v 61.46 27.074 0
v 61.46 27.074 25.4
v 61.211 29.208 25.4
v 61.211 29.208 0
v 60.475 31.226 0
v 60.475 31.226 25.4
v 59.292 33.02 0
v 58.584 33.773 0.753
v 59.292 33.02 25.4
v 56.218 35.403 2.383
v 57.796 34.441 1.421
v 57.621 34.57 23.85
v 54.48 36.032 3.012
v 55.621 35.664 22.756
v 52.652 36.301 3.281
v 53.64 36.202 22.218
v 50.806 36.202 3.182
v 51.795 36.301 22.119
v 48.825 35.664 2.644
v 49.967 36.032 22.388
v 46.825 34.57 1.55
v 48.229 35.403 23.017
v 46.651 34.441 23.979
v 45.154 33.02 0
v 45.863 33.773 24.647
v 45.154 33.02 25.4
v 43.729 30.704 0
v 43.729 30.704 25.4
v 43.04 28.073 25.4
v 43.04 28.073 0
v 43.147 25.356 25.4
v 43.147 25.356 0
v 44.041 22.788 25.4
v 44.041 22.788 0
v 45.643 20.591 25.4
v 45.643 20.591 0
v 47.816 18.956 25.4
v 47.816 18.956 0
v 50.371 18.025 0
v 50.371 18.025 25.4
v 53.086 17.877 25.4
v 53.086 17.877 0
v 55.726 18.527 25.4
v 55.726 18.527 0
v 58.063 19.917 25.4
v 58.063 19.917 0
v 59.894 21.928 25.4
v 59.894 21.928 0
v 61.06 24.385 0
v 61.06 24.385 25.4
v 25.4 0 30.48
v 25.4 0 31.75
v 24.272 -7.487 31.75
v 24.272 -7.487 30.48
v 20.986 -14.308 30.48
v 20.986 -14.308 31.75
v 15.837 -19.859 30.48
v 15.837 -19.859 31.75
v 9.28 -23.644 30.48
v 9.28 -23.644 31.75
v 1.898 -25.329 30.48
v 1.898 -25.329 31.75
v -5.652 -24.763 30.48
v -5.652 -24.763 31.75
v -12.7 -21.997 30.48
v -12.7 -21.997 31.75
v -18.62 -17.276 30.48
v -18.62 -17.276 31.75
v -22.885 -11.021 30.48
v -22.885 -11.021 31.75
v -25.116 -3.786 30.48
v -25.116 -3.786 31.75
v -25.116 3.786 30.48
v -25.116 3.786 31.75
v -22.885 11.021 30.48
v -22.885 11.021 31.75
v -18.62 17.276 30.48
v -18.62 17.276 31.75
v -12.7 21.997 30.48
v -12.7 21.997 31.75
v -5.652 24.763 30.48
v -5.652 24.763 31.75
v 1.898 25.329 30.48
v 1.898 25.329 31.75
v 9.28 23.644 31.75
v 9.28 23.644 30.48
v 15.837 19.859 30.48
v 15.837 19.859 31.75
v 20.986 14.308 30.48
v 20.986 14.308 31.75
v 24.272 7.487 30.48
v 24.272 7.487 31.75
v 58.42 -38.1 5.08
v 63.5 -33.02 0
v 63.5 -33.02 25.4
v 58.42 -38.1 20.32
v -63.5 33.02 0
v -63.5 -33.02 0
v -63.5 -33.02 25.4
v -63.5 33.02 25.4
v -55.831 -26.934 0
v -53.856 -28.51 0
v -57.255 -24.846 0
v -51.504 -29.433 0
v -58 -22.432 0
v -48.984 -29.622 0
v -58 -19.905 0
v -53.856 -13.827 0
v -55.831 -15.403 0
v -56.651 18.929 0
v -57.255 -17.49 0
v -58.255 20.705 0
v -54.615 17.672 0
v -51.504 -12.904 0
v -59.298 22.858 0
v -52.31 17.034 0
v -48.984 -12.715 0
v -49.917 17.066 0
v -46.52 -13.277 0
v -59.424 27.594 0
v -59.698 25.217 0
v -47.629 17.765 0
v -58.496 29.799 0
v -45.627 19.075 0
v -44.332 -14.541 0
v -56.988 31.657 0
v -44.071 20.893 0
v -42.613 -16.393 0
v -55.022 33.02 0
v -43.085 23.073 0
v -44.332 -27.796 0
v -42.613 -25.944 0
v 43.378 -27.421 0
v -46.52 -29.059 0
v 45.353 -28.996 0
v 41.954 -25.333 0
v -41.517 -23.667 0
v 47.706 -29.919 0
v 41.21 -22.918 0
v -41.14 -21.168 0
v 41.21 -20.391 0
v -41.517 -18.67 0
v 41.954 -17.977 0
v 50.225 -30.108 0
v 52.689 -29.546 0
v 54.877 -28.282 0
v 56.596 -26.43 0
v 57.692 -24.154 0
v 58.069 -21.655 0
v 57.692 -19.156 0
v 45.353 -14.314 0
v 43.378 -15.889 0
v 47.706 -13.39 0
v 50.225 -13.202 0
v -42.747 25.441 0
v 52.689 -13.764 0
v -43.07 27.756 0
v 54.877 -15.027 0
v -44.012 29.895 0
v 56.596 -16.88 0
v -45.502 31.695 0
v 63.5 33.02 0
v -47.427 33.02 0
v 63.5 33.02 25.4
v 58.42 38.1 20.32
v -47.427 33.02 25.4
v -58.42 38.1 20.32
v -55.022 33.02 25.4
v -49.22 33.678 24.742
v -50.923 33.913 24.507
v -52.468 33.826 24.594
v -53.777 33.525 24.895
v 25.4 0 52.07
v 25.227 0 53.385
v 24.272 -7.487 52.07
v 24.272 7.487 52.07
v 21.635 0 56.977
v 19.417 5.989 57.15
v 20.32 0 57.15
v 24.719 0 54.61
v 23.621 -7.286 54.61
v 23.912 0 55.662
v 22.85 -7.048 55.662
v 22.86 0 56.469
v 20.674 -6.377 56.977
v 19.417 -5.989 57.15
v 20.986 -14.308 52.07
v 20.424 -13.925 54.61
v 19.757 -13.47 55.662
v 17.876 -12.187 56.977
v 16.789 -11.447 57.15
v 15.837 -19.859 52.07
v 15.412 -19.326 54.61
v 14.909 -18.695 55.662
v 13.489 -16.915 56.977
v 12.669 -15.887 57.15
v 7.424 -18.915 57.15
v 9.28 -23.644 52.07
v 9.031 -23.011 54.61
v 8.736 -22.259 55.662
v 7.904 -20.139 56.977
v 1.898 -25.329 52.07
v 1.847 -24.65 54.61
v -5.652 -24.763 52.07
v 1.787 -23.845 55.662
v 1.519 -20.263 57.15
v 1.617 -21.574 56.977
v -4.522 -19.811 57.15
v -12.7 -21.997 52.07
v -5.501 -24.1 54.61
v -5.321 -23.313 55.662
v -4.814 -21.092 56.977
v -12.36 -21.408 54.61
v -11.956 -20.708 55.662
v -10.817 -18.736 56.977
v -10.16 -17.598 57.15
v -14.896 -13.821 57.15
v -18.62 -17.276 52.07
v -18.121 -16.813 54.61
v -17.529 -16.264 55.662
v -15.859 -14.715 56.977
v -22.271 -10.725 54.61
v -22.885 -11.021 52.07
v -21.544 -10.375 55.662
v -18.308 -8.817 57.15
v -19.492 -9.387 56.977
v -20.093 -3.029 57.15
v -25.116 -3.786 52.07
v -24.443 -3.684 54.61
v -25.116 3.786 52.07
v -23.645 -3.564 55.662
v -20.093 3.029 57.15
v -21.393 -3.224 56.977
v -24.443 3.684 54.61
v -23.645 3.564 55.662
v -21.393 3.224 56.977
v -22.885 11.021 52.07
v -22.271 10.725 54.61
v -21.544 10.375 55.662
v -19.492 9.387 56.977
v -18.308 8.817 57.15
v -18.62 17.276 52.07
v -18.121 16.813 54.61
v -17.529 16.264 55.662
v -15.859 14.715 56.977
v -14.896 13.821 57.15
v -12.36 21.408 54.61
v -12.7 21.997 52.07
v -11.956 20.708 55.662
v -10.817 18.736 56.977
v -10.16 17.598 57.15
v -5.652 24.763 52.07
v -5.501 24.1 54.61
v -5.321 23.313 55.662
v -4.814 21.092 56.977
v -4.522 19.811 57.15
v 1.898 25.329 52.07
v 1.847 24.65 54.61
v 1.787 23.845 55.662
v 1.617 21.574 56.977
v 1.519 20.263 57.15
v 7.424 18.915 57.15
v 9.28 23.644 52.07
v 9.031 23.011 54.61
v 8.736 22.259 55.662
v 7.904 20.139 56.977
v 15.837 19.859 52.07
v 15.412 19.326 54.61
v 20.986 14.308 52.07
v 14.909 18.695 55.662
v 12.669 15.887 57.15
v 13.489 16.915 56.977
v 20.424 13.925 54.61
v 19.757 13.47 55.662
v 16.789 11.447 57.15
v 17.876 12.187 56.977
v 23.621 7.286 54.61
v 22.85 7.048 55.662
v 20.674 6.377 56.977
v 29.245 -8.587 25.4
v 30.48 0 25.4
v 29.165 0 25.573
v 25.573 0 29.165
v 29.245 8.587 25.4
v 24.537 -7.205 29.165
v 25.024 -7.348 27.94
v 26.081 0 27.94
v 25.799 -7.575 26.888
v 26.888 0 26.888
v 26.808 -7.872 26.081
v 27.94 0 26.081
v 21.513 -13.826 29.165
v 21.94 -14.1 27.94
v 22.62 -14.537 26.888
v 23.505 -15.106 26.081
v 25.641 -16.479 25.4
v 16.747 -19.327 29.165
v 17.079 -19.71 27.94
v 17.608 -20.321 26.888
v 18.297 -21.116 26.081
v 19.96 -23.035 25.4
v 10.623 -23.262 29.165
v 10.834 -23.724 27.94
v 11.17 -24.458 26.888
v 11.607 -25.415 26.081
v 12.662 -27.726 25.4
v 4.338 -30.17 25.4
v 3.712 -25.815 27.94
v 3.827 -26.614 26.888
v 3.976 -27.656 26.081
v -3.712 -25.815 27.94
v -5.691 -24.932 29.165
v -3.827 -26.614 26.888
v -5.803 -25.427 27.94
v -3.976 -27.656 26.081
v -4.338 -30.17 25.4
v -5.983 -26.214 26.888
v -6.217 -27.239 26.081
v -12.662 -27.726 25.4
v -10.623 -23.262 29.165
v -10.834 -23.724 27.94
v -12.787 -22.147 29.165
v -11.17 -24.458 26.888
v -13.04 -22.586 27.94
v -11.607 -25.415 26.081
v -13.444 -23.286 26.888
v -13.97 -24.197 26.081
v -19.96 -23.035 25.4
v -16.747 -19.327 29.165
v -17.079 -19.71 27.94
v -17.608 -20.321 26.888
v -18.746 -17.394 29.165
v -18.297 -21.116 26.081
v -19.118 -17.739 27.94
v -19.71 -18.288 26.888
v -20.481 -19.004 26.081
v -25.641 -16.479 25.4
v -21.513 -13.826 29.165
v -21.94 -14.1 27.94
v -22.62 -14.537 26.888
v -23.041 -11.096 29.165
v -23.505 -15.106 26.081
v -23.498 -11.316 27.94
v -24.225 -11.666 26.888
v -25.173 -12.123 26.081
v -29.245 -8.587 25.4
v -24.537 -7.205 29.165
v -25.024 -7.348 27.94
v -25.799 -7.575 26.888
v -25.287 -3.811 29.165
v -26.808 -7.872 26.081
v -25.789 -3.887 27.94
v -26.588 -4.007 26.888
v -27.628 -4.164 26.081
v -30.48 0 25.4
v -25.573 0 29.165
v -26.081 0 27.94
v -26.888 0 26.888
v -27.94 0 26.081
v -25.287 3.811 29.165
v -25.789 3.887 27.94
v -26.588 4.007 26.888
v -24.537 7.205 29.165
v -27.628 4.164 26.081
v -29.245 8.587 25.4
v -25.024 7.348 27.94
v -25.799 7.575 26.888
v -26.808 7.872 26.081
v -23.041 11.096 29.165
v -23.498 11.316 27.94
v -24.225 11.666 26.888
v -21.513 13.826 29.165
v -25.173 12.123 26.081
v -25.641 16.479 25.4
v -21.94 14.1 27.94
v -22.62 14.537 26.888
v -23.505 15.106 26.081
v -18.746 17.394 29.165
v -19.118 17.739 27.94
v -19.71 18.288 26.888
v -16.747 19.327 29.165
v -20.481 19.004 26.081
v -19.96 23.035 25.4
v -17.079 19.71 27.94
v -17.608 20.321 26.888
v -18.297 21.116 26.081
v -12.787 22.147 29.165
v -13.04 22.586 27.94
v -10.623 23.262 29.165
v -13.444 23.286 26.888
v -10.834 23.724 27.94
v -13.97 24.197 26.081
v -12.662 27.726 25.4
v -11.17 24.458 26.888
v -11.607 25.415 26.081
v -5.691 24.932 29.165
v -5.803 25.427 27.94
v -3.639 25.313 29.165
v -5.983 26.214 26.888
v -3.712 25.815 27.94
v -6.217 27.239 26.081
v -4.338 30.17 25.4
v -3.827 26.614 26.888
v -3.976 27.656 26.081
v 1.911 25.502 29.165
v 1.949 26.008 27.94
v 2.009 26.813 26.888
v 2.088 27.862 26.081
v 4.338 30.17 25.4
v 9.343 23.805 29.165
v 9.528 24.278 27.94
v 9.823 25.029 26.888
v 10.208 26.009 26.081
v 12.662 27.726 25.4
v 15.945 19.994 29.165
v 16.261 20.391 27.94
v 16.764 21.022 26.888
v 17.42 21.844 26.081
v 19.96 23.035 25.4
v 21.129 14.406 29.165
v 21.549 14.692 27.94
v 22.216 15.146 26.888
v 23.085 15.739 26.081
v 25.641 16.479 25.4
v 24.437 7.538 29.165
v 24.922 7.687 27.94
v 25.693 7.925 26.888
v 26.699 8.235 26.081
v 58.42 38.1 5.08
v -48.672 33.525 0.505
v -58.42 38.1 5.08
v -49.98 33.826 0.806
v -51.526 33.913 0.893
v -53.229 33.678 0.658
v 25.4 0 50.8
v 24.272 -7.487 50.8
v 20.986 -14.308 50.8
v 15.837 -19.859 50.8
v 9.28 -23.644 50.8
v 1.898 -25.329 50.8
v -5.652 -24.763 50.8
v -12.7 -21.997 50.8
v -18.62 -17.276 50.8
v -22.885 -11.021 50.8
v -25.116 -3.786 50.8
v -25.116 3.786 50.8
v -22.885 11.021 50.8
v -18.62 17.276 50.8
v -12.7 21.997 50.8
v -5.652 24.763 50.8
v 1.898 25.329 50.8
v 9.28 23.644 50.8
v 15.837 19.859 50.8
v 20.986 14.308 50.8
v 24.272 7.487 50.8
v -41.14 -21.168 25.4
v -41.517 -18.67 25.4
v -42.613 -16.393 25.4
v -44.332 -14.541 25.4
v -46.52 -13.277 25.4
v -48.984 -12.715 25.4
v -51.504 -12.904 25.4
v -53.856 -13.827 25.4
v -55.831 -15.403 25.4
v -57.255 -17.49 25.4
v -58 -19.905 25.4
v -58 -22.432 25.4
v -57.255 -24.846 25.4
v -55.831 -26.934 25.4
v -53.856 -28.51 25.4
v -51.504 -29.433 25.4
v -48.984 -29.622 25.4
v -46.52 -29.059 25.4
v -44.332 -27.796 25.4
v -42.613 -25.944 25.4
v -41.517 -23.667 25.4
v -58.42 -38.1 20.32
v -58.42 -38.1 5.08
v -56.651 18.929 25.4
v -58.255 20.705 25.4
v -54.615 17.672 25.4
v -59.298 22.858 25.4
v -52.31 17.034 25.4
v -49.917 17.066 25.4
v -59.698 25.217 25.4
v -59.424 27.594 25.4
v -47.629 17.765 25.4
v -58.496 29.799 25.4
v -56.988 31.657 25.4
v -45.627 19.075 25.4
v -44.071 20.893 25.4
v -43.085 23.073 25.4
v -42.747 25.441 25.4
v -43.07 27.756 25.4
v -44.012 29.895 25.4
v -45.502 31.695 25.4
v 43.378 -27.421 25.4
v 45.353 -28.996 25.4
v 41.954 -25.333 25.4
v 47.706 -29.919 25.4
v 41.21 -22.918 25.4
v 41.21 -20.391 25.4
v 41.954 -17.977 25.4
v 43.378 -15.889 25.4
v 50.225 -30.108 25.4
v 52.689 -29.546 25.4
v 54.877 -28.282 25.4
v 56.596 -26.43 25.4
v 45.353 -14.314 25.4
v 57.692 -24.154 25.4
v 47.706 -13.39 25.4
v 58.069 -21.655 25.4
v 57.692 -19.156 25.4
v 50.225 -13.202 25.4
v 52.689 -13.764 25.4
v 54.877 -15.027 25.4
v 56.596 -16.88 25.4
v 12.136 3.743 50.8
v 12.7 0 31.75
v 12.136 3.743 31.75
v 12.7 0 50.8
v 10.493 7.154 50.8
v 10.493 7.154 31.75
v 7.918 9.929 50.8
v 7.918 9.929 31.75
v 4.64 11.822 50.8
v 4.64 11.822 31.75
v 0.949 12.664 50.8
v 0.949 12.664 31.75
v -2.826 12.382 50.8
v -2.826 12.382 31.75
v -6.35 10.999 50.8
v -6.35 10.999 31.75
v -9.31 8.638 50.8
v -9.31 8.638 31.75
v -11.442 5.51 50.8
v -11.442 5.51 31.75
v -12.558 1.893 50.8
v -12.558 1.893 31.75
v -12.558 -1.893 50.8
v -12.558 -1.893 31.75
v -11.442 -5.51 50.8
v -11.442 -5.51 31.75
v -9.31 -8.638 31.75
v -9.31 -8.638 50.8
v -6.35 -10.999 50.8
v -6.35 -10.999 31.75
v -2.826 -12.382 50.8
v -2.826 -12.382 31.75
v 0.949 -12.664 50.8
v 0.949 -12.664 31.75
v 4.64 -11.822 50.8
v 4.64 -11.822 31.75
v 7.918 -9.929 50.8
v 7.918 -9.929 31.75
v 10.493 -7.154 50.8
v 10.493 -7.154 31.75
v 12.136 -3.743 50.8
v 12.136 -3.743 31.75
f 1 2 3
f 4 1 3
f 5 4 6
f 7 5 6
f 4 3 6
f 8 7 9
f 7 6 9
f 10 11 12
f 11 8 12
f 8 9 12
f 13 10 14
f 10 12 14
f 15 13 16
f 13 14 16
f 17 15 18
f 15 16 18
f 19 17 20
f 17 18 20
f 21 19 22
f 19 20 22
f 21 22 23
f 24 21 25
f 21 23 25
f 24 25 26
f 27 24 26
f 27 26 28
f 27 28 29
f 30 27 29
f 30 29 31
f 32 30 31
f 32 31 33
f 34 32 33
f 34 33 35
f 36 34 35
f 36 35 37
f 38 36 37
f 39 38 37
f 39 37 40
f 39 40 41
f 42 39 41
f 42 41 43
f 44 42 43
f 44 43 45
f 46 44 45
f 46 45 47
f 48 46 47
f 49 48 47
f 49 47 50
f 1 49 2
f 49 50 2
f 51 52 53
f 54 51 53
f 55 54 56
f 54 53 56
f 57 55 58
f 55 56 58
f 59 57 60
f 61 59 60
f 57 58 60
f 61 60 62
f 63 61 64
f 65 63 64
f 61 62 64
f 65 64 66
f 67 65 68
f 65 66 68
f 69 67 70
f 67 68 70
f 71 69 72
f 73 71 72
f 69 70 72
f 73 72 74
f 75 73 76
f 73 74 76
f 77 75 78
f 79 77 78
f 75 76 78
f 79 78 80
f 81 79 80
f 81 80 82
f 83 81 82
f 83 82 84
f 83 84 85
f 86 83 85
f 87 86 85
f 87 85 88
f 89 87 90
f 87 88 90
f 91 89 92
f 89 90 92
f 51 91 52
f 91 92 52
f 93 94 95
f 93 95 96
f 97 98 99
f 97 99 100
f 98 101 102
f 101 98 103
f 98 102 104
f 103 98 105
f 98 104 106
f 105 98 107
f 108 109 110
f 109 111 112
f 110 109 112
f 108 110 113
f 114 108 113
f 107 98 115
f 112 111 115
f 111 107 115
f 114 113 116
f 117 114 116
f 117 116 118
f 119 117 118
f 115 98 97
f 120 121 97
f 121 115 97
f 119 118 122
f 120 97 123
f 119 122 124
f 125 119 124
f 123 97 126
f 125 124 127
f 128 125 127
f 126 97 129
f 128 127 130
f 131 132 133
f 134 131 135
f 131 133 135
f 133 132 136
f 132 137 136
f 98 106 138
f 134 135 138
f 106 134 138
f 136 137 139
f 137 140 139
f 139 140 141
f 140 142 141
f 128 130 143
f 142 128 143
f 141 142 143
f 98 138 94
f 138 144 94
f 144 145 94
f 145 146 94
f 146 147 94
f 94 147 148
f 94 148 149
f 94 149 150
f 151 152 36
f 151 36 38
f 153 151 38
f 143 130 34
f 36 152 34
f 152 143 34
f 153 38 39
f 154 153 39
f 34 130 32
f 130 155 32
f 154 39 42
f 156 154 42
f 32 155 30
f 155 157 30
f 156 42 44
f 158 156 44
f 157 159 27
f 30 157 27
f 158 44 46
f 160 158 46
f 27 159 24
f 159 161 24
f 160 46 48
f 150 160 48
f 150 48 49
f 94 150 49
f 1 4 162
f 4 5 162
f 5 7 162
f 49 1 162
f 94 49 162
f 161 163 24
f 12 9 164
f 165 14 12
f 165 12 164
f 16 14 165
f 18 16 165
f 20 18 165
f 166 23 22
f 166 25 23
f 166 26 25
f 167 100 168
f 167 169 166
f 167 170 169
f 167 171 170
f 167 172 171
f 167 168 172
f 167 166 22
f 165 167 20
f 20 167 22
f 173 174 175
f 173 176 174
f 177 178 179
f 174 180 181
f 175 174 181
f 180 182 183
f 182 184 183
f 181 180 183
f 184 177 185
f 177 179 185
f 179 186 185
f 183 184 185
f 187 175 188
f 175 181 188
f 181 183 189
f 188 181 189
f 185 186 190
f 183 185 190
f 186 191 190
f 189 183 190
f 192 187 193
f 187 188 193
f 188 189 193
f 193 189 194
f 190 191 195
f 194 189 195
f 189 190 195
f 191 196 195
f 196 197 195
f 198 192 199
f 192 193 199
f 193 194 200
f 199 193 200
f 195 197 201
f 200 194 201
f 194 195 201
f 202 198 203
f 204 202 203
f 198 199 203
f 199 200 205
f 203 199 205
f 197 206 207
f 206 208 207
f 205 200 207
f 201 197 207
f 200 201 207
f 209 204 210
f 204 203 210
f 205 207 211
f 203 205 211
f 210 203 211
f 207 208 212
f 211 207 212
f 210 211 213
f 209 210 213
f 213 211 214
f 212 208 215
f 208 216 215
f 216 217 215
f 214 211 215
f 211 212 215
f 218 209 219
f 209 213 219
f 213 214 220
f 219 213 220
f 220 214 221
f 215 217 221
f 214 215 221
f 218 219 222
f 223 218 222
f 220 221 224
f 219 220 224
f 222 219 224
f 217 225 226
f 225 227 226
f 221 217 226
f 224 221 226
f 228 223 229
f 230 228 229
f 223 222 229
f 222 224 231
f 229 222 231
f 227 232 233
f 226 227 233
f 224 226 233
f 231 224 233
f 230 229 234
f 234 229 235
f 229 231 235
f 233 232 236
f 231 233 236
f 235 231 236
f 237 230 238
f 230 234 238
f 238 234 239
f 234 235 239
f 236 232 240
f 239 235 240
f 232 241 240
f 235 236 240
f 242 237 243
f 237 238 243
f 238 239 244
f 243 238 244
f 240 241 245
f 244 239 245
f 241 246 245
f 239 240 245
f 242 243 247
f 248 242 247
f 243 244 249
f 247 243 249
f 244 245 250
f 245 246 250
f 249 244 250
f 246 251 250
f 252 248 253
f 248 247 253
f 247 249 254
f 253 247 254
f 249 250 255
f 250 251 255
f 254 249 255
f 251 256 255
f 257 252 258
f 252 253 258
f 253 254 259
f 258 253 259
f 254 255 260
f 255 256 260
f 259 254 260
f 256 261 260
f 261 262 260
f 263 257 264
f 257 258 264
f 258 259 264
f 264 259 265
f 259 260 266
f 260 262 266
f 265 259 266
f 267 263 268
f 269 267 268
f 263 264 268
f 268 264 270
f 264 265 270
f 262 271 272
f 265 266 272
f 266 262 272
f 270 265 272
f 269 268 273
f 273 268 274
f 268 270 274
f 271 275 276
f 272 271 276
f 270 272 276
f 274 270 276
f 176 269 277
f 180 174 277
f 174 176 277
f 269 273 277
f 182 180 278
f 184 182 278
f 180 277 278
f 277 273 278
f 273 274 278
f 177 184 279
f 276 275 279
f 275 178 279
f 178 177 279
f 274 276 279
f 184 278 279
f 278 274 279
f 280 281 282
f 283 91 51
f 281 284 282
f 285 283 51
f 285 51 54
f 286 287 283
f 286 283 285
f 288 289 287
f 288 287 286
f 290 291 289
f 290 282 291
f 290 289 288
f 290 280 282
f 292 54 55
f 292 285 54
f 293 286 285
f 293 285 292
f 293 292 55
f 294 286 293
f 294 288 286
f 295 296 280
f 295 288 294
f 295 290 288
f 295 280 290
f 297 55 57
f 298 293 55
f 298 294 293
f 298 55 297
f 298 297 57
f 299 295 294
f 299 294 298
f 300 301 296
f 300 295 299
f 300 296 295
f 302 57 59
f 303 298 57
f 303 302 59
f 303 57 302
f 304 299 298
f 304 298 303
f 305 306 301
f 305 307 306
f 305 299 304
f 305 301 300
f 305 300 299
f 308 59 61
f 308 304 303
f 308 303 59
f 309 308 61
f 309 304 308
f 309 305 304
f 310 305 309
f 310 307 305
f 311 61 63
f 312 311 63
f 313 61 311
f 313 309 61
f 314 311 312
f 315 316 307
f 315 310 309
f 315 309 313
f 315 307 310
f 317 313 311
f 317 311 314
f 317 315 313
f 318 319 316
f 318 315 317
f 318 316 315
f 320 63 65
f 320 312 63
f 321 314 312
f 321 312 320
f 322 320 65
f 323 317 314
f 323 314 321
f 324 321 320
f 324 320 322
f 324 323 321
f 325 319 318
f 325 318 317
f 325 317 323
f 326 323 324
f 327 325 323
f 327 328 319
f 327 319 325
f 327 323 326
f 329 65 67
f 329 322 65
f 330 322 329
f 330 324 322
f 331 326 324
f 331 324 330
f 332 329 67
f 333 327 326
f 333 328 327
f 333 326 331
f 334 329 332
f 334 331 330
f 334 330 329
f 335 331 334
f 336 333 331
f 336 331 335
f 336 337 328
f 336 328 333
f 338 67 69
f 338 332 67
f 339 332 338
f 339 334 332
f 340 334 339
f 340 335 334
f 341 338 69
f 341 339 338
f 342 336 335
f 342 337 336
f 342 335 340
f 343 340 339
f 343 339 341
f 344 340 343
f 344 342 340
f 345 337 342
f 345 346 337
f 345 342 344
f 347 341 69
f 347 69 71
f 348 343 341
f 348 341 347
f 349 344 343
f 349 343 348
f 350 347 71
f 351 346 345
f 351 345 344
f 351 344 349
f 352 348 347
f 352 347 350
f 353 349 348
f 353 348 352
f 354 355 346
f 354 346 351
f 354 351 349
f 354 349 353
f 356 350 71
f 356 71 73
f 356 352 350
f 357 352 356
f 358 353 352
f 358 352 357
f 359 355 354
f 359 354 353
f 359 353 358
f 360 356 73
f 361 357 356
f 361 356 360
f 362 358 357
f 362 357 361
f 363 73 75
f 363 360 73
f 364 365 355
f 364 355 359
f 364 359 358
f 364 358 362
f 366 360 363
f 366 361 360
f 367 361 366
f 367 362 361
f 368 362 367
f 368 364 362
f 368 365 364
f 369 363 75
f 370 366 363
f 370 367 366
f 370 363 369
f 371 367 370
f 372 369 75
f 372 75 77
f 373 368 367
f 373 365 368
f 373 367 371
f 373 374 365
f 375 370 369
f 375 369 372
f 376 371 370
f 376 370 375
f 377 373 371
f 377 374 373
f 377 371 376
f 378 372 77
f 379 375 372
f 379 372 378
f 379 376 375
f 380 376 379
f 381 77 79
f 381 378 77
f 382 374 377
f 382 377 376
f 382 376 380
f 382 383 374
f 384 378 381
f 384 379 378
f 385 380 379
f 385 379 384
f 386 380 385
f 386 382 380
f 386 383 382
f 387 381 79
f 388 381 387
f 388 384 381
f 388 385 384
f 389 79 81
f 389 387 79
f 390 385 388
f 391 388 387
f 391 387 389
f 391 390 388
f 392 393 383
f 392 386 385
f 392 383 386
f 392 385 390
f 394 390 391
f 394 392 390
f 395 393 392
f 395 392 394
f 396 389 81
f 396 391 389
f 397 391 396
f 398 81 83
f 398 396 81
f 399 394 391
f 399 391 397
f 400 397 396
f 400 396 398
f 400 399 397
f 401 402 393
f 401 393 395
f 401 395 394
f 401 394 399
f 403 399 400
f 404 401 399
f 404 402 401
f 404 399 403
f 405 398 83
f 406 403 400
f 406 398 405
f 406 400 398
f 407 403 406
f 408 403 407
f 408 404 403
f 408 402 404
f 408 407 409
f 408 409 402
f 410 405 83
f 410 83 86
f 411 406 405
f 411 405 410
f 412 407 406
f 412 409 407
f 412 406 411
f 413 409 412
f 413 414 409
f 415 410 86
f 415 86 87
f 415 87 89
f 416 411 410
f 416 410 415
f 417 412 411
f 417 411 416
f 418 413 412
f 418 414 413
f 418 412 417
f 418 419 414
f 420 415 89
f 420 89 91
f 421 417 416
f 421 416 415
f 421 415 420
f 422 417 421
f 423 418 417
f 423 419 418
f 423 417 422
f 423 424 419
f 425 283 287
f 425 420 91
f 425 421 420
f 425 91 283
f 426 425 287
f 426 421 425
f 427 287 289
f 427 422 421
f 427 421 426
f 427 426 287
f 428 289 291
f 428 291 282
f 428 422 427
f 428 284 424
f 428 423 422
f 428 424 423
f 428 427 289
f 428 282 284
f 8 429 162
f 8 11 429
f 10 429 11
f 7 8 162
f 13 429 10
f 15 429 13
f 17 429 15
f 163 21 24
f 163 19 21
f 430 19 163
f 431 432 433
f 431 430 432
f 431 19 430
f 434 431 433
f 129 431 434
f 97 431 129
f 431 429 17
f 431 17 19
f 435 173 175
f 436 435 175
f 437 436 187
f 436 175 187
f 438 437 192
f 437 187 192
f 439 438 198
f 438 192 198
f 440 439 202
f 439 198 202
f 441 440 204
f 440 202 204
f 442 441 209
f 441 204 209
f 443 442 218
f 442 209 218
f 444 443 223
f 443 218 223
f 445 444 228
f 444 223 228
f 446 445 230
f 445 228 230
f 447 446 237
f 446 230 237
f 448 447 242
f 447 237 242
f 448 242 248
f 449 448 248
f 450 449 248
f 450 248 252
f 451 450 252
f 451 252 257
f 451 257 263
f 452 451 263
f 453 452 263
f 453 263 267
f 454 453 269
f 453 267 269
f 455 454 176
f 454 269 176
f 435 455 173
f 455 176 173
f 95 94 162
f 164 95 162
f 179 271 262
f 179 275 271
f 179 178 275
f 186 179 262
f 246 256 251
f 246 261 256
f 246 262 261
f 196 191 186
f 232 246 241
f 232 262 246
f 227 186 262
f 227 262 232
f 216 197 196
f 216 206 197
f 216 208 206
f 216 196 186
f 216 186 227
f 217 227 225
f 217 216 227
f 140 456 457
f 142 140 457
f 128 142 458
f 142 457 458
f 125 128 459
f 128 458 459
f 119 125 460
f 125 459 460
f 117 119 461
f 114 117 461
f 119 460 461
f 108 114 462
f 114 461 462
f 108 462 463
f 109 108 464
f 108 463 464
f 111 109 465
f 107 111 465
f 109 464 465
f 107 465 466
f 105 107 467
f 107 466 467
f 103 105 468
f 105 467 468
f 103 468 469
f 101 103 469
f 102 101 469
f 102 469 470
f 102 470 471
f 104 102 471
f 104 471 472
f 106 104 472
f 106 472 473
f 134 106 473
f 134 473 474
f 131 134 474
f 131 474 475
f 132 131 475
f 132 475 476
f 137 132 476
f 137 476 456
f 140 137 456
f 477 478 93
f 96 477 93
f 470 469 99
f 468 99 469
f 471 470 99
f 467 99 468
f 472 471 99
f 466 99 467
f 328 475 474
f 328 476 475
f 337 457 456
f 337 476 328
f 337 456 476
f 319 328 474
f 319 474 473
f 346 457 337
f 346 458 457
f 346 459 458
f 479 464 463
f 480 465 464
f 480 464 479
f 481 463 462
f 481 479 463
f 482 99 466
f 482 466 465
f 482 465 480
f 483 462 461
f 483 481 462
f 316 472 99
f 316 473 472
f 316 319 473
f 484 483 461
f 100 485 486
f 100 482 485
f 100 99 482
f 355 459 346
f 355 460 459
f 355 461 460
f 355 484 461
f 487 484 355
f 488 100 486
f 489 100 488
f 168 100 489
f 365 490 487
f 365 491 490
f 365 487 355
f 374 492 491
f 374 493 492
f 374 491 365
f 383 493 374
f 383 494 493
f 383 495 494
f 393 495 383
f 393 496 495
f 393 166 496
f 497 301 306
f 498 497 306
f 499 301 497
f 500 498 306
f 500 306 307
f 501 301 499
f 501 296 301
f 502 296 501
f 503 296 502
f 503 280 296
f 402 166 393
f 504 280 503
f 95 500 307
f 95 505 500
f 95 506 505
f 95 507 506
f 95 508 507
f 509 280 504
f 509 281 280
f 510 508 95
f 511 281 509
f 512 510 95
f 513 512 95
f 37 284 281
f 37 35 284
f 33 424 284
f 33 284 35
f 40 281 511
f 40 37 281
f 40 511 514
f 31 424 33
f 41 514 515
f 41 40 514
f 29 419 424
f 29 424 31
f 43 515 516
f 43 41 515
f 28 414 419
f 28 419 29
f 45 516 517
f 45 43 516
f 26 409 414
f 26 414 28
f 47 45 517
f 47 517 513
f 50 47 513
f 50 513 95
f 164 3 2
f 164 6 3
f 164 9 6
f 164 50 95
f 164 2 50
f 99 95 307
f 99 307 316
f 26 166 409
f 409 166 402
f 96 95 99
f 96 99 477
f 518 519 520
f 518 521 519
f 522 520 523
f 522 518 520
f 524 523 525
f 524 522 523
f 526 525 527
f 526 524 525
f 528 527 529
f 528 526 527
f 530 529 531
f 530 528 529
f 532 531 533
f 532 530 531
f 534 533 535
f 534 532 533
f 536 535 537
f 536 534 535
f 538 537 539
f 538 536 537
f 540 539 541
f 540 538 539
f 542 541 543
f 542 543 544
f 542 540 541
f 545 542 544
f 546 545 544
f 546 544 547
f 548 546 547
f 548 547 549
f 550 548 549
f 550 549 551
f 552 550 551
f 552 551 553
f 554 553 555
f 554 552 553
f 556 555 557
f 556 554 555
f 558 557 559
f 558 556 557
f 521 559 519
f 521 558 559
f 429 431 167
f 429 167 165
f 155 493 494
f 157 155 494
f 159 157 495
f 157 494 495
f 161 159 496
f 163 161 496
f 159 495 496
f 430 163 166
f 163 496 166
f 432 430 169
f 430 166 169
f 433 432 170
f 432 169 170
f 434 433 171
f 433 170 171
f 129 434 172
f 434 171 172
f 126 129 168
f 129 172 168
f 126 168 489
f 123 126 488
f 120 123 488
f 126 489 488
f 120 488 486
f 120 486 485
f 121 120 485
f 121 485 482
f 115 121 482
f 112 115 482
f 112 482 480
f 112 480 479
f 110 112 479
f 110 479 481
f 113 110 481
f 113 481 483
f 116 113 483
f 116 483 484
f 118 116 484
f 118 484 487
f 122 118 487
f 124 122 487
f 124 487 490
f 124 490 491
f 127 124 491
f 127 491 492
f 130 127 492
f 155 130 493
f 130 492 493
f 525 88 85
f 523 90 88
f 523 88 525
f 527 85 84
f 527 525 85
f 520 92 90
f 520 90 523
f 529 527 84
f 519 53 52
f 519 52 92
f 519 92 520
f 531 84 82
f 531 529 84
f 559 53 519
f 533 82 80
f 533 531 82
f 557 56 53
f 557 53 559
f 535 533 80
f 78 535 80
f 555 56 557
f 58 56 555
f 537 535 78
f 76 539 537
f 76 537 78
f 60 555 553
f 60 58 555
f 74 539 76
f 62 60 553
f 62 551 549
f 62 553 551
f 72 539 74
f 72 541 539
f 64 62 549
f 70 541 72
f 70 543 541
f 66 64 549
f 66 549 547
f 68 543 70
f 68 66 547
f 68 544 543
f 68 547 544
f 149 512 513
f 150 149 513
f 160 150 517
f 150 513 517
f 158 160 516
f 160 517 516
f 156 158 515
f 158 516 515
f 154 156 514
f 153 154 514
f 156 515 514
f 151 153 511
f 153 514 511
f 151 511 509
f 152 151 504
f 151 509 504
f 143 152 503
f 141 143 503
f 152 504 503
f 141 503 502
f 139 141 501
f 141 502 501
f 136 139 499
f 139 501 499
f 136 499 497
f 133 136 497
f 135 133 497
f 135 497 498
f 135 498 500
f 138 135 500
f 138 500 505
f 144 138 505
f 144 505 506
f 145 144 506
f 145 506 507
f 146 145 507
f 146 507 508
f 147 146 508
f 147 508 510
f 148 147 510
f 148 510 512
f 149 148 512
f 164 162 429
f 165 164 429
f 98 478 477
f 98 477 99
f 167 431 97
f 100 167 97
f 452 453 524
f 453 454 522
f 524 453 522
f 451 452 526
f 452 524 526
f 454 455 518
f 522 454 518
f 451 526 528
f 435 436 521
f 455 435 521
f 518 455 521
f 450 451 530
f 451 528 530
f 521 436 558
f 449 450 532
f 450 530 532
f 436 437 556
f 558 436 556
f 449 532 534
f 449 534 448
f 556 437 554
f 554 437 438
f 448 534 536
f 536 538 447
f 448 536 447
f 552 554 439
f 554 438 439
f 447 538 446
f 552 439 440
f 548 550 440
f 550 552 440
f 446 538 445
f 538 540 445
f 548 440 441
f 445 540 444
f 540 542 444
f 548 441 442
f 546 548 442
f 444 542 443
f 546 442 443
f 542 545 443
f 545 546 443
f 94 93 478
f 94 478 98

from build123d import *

# Parameters (mm, degrees)
F0_W         = 127
F0_H         = 76.2
F1_DEPTH     = 25.4
F2_R         = 8.4769821521
F2_R_2       = 9.2372123091
F3_DEPTH     = 25.401
F4_W         = 12.7
F4_H         = 25.4
F6_W         = 25.4
F6_H         = 6.35
F8_W         = 25.4
F8_H         = 6.35
F10_R        = 5.08
F11_T1_DEPTH = 51.5282991577
F11_T3_DEPTH = 153.1282991577


# Not quite as in the source:
# - a fillet or chamfer that OpenCascade refuses, or shapes differently, is made with other operations: its cross-section is extruded or revolved along the edge and cut away or added


with BuildPart() as f1:
    # F0 (on Top) → F1 (new body)
    with BuildSketch(Plane.XY):
        Rectangle(F0_W, F0_H)
    extrude(amount=F1_DEPTH)

    # F2 (on face) → F3 (cut, through all)
    with BuildSketch(Plane.XY.offset(25.4)):
        with Locations((-51.2244440438, 25.4412265494)):
            Circle(F2_R)
        with Locations((-49.6174134314, -21.1683232337)):
            Circle(F2_R)
        with Locations((52.2232688963, 27.0741768181)):
            Circle(F2_R_2)
        with Locations((49.5918877423, -21.6549038887)):
            Circle(F2_R)
    extrude(amount=-F3_DEPTH, mode=Mode.SUBTRACT)

    # F4 (on Front) → F5 (revolve)
    with BuildSketch(Plane.XZ):
        with Locations((6.35, 38.1)):
            Rectangle(F4_W, F4_H)
    revolve(axis=Axis((0, 0, 38.1), (0, 0, 1)))

    # F6 (on Front) → F7 (revolve)
    with BuildSketch(Plane.XZ):
        with Locations((12.7, 53.975)):
            Rectangle(F6_W, F6_H)
    revolve(axis=Axis((0, 0, 53.975), (0, 0, -1)))

    # F8 (on Front) → F9 (revolve)
    with BuildSketch(Plane.XZ):
        with Locations((12.7, 28.575)):
            Rectangle(F8_W, F8_H)
    revolve(axis=Axis((0, 0, 28.575), (0, 0, -1)))

    # F10
    f10_edges = [f1.edges().sort_by_distance(p)[0] for p in [
        (-25.4, 0, 57.15),
        (-25.4, 0, 25.4),
    ]]
    fillet(f10_edges, radius=F10_R)

    # F11: chamfer of 5.08 on 8 edges, made by hand

    # F11_s2 → F11_t1 (cut)
    with BuildSketch(Plane.XY.offset(-13.0641495789)):
        Polygon((-58.42, -38.1), (-63.5, -33.02), (-63.5, -38.1), align=None)
        Polygon((63.5, -33.02), (58.42, -38.1), (63.5, -38.1), align=None)
        Polygon((63.5, 33.02), (58.42, 38.1), (63.5, 38.1), align=None)
        Polygon((-58.42, 38.1), (-63.5, 33.02), (-63.5, 38.1), align=None)
    extrude(amount=F11_T1_DEPTH, mode=Mode.SUBTRACT)

    # F11_s4 → F11_t3 (cut)
    with BuildSketch(Plane.YZ.offset(-76.5641495789)):
        Polygon((-38.1, 5.08), (-33.02, 0), (-38.1, 0), align=None)
        Polygon((-33.02, 25.4), (-38.1, 20.32), (-38.1, 25.4), align=None)
        Polygon((38.1, 5.08), (33.02, 0), (38.1, 0), align=None)
        Polygon((33.02, 25.4), (38.1, 20.32), (38.1, 25.4), align=None)
    extrude(amount=F11_T3_DEPTH, mode=Mode.SUBTRACT)


solid = f1.part
